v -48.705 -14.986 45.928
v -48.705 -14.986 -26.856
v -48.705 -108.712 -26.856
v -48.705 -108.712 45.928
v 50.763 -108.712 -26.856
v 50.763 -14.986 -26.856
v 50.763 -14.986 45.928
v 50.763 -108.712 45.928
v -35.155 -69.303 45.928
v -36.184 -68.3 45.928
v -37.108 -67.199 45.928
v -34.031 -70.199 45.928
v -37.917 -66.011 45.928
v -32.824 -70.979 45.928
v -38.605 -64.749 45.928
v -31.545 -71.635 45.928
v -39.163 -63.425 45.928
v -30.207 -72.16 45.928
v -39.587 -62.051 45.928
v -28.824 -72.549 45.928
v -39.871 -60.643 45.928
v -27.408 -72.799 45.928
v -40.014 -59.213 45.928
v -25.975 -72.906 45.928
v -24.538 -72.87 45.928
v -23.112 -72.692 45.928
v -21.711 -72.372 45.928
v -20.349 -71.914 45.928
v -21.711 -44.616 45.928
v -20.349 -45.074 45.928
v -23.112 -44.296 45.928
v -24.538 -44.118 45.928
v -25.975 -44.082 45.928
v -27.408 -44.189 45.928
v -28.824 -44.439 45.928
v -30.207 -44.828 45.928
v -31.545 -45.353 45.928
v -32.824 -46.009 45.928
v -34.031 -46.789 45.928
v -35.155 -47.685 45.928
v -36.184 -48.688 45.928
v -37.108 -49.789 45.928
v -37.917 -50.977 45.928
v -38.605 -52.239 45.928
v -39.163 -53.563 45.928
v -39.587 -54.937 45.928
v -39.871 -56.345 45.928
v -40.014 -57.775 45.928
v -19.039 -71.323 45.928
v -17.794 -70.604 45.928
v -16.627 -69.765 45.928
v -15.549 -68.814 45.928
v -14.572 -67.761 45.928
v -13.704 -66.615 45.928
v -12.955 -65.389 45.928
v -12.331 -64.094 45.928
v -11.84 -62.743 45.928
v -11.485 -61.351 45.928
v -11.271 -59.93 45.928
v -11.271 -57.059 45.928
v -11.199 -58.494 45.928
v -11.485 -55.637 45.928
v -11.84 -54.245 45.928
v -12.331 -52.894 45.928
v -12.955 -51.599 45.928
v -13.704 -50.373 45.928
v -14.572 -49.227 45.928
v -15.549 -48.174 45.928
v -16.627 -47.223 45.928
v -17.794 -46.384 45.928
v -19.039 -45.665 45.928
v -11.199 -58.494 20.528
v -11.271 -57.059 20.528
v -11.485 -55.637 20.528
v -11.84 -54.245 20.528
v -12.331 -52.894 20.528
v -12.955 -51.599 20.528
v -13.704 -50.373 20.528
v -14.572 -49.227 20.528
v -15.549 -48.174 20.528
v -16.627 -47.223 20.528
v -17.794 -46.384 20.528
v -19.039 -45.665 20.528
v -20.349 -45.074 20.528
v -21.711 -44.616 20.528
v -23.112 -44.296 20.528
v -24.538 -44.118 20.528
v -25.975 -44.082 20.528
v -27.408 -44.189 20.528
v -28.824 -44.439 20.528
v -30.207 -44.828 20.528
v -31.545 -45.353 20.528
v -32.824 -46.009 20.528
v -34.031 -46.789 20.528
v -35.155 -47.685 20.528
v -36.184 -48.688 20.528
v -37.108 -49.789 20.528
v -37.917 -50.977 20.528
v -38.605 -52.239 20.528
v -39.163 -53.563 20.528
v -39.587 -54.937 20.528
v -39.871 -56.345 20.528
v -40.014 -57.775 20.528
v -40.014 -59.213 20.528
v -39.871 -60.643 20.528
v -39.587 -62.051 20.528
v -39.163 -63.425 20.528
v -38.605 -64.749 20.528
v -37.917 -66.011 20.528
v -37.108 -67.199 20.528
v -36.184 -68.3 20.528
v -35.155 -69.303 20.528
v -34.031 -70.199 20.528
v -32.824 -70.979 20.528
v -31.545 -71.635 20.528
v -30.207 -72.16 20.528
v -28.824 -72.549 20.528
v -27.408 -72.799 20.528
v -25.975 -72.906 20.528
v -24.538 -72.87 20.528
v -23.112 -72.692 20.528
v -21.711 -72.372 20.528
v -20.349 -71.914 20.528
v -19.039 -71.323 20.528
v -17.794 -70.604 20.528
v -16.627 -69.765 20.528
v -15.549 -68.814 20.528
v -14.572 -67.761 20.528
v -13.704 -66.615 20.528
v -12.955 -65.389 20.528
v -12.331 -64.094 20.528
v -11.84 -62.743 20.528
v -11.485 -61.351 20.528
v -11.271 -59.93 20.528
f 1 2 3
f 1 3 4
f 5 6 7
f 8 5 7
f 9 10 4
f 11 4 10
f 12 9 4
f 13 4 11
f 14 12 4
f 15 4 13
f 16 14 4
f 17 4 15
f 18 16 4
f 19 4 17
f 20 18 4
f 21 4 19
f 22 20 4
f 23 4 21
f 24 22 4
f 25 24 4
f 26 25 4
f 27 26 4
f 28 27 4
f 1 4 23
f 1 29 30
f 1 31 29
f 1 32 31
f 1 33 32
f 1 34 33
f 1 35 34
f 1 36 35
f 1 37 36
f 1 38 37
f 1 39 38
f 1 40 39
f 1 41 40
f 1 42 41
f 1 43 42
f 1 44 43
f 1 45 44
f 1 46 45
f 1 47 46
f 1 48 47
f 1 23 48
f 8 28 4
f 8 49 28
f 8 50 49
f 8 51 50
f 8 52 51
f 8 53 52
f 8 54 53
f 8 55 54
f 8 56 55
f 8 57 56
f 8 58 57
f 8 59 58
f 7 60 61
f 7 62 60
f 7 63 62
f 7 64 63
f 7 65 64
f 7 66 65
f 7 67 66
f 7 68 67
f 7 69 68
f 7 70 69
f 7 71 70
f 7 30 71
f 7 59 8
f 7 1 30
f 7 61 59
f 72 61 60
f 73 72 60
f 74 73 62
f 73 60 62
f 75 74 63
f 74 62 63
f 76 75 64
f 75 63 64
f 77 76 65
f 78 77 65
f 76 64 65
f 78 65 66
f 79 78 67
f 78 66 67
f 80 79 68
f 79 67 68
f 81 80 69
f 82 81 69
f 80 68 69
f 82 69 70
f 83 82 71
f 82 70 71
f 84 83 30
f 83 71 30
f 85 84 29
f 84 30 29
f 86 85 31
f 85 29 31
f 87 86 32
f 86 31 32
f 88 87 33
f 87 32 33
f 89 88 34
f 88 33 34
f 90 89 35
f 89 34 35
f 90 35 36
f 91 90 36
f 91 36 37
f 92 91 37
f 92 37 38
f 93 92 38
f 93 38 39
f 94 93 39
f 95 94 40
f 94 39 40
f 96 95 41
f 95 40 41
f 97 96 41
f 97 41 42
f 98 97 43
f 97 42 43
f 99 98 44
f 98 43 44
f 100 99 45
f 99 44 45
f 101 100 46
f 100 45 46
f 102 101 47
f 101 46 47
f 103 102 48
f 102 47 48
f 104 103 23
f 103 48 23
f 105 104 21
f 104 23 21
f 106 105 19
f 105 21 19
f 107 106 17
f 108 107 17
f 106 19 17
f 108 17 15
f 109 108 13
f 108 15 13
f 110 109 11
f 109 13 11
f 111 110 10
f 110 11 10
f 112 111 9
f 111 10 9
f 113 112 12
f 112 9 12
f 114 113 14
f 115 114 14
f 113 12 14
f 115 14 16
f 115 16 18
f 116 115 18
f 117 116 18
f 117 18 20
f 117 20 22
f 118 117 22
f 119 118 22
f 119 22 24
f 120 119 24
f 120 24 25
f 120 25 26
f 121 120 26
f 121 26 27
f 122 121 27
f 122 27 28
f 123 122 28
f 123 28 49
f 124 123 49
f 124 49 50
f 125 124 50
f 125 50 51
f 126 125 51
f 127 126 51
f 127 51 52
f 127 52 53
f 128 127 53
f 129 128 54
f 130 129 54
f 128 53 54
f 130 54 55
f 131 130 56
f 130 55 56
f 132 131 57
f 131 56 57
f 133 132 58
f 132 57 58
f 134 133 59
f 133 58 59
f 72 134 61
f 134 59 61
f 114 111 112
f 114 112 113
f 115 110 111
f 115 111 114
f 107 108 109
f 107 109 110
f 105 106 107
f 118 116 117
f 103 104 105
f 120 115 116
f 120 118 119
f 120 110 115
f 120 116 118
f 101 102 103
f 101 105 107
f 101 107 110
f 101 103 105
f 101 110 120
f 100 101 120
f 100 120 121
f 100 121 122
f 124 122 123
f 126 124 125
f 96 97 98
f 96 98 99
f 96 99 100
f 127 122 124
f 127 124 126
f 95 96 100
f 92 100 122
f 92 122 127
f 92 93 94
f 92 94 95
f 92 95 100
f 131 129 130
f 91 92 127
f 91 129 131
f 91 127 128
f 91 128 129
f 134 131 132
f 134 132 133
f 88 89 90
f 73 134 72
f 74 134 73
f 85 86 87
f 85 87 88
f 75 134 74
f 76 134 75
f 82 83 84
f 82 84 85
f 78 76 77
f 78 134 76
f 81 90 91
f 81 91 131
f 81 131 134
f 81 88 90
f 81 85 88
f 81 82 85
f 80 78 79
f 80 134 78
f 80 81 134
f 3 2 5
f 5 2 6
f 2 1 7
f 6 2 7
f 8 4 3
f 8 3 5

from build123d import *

# Parameters (mm, degrees)
F0_W     = 99.467852
F0_H     = 72.783896
F1_DEPTH = 93.726
F2_R     = 14.41662
F3_DEPTH = 25.4


with BuildPart() as f1:
    # F0 (on Front) → F1 (new body)
    with BuildSketch(Plane.XZ):
        with Locations((-12.687225, 5.47232)):
            Rectangle(F0_W, F0_H)
    extrude(amount=F1_DEPTH)

    # F2 (on face) → F3 (cut)
    with BuildSketch(Plane.XY.offset(41.864268)):
        with Locations((-39.331704, -43.508075)):
            Circle(F2_R)
    extrude(amount=-F3_DEPTH, mode=Mode.SUBTRACT)


with BuildPart() as f1_1:
    # F4: moved
    add(f1.part.moved(Location((13.716, -14.986, 4.064))))


solid = f1_1.part
